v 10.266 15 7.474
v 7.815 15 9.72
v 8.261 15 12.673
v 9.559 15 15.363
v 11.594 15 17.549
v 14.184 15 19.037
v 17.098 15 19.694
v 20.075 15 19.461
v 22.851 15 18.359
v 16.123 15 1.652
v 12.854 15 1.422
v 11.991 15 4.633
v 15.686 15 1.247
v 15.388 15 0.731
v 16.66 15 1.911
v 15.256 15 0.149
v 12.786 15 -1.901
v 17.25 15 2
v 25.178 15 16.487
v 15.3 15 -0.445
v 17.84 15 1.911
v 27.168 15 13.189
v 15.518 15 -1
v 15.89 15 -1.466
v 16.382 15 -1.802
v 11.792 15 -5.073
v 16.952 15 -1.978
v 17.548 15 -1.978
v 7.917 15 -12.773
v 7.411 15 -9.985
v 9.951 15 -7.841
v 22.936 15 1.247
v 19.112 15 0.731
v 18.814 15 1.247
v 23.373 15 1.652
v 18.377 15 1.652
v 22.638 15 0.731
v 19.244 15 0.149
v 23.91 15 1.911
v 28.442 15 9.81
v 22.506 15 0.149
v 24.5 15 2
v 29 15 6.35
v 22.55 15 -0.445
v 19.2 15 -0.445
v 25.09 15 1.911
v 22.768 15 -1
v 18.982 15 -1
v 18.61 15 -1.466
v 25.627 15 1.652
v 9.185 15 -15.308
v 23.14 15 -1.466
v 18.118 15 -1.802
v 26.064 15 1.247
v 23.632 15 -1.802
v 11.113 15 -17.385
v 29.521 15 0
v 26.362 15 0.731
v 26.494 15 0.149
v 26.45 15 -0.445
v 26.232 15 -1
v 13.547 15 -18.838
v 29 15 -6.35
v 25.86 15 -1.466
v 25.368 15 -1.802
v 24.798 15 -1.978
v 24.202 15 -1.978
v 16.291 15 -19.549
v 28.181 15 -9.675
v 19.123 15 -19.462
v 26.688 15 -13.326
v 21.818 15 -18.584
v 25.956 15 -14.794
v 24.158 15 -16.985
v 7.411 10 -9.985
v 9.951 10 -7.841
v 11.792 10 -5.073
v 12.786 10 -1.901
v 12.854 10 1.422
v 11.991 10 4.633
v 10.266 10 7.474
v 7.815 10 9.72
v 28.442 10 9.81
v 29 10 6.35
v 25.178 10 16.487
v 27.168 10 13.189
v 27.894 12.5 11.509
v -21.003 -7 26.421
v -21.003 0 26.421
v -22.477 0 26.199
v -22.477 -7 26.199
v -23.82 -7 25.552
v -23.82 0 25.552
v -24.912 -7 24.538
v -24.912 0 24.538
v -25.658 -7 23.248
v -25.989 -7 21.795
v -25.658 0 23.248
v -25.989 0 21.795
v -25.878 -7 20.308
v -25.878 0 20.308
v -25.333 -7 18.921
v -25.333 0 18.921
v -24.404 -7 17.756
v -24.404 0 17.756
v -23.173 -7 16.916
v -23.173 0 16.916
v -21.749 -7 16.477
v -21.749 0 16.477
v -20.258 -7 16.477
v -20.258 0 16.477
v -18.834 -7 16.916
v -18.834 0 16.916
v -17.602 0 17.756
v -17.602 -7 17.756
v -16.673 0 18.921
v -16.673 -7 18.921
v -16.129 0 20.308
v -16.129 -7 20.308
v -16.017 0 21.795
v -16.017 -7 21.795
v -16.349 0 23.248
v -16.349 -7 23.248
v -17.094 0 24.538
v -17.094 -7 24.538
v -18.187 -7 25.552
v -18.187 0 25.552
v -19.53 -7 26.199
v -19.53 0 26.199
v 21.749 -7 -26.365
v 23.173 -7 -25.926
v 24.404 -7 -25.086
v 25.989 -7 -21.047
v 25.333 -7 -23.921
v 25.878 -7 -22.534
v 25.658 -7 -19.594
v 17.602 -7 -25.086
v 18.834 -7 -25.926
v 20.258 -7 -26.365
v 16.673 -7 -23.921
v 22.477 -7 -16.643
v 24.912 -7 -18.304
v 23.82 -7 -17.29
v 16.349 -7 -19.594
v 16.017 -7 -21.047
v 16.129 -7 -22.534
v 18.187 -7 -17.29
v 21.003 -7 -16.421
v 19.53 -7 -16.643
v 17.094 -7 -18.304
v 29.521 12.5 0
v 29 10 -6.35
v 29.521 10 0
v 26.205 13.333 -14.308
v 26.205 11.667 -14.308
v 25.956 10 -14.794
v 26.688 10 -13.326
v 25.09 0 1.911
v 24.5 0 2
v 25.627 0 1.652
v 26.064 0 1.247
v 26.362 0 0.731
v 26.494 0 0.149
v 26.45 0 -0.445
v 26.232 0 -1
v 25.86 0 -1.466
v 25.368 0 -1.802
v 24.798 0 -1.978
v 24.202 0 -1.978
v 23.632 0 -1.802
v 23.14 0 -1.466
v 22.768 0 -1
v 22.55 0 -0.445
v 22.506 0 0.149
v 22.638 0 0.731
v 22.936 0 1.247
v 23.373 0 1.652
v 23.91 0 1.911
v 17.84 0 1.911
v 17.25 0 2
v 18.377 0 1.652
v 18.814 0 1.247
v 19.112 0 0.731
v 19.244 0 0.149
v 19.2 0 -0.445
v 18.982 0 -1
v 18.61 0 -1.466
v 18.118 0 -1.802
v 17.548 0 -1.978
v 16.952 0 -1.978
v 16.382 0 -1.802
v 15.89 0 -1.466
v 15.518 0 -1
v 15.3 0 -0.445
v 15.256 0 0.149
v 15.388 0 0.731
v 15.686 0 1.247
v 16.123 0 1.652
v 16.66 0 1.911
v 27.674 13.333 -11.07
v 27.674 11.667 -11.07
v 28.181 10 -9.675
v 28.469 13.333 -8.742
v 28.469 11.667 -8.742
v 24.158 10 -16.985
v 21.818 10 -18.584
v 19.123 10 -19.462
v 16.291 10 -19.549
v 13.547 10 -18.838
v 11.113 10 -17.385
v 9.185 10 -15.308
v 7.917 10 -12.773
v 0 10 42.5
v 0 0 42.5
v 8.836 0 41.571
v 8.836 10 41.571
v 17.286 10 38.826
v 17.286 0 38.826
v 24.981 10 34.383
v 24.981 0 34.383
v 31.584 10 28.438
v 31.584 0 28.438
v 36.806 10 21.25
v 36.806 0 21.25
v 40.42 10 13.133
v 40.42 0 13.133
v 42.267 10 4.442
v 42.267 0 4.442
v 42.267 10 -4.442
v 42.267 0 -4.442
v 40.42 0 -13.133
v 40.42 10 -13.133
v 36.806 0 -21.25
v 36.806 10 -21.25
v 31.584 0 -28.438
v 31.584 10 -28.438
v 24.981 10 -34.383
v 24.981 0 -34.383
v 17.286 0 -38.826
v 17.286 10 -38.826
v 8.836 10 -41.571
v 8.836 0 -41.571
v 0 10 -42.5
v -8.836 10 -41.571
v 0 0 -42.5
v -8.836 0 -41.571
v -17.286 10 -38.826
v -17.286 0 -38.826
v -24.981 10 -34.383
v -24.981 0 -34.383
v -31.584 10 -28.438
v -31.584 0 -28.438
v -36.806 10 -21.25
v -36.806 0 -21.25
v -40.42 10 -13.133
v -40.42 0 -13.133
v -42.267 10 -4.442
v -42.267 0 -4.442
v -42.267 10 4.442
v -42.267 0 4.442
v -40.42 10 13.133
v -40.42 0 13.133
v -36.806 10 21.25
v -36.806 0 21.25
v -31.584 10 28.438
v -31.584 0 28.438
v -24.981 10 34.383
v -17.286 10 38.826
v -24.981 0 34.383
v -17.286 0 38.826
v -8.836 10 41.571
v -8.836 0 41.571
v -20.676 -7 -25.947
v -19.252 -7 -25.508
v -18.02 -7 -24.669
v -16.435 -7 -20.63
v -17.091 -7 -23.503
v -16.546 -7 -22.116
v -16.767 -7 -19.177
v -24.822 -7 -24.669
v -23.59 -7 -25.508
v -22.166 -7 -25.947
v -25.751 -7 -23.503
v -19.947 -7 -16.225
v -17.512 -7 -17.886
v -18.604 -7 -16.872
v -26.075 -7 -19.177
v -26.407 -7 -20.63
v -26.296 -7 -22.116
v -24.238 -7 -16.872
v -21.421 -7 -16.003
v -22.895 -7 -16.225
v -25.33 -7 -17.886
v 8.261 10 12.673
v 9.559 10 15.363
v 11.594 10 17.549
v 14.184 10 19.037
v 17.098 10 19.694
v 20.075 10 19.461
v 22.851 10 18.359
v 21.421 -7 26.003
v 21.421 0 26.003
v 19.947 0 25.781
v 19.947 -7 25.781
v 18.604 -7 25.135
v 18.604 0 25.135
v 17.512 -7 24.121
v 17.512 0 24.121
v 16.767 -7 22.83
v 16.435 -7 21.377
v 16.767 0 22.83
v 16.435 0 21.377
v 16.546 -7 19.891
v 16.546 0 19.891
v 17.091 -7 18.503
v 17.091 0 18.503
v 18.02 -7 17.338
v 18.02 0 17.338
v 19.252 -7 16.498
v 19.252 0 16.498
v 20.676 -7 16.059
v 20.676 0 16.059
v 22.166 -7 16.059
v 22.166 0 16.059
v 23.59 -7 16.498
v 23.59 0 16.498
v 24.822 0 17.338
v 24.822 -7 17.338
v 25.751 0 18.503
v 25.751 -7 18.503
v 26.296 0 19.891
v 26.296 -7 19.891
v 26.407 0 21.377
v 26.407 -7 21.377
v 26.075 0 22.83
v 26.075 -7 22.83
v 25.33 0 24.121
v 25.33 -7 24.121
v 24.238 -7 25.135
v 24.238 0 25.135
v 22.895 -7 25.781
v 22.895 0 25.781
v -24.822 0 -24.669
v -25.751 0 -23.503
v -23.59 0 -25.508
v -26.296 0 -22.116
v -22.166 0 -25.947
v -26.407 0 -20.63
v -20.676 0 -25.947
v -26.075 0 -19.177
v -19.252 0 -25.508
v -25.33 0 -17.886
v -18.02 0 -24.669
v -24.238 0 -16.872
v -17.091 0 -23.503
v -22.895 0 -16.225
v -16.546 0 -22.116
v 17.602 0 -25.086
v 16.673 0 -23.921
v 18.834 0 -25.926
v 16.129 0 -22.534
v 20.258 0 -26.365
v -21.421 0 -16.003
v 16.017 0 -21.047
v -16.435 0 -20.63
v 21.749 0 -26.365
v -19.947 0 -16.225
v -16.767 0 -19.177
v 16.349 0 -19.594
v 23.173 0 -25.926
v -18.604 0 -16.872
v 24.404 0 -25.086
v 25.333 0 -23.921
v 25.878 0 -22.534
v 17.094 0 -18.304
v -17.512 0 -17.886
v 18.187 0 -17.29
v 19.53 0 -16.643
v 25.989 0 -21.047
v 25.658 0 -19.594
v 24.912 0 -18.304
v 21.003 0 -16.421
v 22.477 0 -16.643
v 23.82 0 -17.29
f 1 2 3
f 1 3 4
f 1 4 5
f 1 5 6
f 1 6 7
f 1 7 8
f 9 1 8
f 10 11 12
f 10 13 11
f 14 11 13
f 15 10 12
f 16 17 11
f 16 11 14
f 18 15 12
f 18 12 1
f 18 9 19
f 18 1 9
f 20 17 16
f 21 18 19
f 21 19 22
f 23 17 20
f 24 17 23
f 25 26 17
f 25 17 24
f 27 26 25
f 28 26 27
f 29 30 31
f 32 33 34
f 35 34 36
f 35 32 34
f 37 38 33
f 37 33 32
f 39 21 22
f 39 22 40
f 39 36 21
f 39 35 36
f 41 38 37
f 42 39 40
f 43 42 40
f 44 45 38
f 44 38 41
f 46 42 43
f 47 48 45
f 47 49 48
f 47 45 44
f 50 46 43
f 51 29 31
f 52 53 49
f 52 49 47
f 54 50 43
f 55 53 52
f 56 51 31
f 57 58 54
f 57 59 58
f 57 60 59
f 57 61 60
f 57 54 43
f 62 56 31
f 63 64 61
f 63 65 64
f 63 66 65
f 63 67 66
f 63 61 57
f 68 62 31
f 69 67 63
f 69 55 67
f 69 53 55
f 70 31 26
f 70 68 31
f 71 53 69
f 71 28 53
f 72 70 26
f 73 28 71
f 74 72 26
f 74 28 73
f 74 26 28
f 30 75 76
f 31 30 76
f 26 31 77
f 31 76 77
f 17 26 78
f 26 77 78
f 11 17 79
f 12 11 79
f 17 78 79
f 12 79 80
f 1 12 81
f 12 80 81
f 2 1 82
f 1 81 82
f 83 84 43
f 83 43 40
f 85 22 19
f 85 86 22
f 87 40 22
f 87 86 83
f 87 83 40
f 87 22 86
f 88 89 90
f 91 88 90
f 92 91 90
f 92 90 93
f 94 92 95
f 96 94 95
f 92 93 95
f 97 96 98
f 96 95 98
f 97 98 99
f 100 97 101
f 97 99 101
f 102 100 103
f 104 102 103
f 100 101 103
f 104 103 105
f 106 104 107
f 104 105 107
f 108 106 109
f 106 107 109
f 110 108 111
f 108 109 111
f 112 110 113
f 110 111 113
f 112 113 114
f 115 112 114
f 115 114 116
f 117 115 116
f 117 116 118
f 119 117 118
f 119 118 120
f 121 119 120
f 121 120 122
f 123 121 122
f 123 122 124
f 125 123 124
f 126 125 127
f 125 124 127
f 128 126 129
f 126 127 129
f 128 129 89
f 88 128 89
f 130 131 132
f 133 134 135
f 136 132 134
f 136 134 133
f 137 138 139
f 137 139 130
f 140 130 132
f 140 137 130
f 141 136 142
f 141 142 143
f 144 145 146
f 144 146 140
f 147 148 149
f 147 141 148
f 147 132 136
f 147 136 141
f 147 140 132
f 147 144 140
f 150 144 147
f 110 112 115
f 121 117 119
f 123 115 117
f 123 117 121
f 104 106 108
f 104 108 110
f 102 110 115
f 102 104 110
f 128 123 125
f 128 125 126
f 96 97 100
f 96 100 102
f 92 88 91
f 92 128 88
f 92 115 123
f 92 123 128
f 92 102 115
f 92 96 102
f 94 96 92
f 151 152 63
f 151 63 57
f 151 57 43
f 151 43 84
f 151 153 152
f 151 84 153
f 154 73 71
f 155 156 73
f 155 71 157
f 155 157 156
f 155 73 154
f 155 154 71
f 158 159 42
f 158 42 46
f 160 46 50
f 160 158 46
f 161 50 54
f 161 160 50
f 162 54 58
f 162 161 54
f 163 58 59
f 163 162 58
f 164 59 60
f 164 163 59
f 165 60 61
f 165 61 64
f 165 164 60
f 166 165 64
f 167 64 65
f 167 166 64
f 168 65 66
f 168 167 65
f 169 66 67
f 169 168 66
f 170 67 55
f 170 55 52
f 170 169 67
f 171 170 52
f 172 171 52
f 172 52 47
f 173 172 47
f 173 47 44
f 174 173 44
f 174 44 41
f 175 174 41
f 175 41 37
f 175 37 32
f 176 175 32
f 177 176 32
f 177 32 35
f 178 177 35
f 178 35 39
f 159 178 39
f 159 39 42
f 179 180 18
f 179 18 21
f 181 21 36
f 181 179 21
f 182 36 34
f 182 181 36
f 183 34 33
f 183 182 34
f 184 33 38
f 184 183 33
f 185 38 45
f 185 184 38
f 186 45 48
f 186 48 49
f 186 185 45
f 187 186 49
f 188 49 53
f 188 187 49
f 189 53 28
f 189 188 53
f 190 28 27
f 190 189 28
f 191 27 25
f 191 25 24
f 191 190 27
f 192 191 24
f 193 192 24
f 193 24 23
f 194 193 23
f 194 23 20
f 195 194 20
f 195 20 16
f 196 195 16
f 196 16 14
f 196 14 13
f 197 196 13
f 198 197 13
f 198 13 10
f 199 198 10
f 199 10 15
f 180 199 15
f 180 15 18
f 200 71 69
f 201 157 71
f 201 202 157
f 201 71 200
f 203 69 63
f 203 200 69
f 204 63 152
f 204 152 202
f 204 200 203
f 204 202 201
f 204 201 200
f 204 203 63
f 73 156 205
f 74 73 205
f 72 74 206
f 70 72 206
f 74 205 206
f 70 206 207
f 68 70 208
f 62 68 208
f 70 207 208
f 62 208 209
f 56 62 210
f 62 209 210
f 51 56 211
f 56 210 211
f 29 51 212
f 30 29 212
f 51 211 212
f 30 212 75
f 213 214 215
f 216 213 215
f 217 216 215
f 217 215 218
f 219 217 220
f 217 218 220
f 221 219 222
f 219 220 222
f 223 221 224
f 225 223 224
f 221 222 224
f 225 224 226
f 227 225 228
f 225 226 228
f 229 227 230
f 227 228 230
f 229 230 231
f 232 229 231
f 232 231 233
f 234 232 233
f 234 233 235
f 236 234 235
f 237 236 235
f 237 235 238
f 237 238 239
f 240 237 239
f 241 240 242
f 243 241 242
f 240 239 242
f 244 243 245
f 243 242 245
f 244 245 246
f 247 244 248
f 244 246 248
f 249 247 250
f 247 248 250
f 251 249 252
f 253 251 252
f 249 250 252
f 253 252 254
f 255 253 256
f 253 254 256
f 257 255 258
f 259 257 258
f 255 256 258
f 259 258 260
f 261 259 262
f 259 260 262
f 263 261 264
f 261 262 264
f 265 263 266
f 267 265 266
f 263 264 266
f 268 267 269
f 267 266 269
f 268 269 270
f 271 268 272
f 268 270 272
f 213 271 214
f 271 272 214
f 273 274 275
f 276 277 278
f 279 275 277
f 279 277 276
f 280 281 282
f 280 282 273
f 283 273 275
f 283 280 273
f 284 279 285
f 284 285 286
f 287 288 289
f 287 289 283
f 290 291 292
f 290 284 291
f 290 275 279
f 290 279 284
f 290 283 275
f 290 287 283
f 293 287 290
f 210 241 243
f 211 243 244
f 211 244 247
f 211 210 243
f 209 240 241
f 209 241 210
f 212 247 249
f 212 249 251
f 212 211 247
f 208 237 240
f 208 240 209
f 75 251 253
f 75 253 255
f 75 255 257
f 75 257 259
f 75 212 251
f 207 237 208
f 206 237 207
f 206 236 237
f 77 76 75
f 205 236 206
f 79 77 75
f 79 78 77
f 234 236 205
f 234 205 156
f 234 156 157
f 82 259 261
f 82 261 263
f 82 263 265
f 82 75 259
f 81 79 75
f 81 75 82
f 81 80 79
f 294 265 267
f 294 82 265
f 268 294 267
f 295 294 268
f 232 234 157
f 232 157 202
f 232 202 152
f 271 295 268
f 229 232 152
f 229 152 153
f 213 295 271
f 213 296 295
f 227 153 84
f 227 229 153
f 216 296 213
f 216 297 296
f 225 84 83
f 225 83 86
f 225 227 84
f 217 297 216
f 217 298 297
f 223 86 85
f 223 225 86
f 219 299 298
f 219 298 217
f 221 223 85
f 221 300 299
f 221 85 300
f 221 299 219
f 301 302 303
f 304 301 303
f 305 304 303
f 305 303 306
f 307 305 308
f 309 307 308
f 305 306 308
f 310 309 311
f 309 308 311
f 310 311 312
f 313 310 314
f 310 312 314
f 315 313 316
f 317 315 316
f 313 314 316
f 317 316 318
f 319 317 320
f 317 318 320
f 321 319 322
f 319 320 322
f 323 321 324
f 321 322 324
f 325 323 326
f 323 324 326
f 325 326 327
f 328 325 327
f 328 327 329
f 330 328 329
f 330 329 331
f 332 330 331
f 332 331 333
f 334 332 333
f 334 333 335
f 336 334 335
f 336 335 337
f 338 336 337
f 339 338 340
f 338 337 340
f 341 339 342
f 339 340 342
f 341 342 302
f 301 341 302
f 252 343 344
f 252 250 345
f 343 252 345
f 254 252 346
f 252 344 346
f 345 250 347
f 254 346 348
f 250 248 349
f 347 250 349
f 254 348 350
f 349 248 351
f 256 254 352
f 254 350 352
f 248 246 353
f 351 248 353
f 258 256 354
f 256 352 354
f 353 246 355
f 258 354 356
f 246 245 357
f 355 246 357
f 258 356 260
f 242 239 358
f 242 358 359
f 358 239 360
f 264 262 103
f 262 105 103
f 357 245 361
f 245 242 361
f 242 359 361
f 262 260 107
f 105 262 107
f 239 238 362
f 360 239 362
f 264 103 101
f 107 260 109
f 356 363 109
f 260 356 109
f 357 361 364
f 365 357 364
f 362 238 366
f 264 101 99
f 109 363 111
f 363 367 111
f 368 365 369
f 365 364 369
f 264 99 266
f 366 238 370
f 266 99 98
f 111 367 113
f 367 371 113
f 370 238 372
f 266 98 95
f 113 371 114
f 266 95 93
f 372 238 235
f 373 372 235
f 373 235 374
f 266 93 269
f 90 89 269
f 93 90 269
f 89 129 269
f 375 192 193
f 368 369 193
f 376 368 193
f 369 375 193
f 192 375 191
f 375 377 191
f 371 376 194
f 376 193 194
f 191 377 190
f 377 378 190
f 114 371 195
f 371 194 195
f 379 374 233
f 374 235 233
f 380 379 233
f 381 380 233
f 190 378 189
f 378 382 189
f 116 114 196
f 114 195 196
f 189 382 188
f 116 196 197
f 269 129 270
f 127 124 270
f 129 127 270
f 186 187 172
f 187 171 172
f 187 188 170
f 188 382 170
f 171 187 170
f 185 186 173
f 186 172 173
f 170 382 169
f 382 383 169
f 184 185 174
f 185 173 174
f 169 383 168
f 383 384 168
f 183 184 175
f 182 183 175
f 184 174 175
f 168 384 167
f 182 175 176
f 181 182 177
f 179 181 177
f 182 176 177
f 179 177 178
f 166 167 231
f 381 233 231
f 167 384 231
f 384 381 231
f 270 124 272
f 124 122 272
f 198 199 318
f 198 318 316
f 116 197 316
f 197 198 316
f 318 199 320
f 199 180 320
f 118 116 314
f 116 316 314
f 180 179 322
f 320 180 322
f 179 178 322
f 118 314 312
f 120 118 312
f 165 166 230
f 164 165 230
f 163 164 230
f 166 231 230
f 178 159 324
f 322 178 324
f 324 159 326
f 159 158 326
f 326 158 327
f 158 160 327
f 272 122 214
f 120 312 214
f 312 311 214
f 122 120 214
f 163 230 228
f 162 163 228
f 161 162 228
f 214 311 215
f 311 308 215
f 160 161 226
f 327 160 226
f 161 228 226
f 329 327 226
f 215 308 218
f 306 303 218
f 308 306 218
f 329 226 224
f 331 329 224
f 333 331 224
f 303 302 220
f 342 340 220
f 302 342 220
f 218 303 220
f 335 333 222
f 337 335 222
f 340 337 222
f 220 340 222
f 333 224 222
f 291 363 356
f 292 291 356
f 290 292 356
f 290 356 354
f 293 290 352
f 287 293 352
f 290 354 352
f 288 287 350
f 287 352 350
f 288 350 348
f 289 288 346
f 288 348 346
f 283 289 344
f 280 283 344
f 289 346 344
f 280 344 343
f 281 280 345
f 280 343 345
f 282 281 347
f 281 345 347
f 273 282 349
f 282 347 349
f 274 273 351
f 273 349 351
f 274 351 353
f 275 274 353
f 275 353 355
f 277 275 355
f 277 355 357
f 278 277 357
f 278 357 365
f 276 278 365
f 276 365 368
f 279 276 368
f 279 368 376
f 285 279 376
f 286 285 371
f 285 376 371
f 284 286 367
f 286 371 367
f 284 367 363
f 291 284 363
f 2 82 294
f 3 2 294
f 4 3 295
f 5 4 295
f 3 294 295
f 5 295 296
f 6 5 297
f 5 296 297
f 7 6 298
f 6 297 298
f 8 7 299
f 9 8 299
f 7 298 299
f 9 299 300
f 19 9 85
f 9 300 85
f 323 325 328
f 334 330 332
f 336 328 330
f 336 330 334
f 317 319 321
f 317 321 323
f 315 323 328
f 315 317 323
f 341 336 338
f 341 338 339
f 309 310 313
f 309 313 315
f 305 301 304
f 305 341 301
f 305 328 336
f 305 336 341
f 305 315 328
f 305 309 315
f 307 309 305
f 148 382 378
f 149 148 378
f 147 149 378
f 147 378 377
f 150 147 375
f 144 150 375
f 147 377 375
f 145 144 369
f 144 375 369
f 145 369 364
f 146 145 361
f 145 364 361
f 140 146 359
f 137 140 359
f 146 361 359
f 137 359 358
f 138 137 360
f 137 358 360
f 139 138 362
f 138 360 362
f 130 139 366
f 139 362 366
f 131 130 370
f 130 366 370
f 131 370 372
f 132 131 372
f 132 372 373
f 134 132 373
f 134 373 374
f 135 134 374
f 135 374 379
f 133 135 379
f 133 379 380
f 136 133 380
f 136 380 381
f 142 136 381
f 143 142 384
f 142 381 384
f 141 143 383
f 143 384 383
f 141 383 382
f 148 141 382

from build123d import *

# Parameters (mm, degrees)
SKETCH1_R               = 42.5
BOSS_EXTRUDE1_DEPTH     = 10
SKETCH2_R               = 5
BOSS_EXTRUDE2_DEPTH     = 7
SKETCH3_R               = 2
BOSS_EXTRUDE3_DEPTH     = 5
CUT_EXTRUDE1_DEPTH      = 63.461988577
CUT_EXTRUDE1_DEPTH_BACK = 63.461988577
SKETCH3_4_R             = 2


with BuildPart() as part:
    # Sketch1 → Boss-Extrude1 (new body)
    with BuildSketch(Plane(origin=(0, 0, 0), x_dir=(1, 0, 0), z_dir=(0, 1, 0))):
        Circle(SKETCH1_R)
    extrude(amount=BOSS_EXTRUDE1_DEPTH)

    # Sketch2 → Boss-Extrude2 (add)
    with BuildSketch(Plane.XZ):
        with Locations((-21.003335433, 21.421015399)):
            Circle(SKETCH2_R)
        with Locations((21.421015399, 21.003335433)):
            Circle(SKETCH2_R)
        with Locations((21.003335433, -21.421015399)):
            Circle(SKETCH2_R)
        with Locations((-21.421015399, -21.003335433)):
            Circle(SKETCH2_R)
    extrude(amount=BOSS_EXTRUDE2_DEPTH)

    # Sketch3 → Boss-Extrude3 (add)
    with BuildSketch(Plane(origin=(0, 10, 0), x_dir=(1, 0, 0), z_dir=(0, 1, 0))):
        with BuildLine():
            ThreePointArc((7.410610084, 9.984822024), (12.938182194, 0.241771609), (7.815144583, -9.719933589))
            ThreePointArc((7.815144583, -9.719933589), (14.183962111, -19.037364236), (25.178047354, -16.486591759))
            add(Edge.make_bspline(
                [(29, -6.35), (28.699050384, -11.600454078), (25.178047354, -16.486591759)],
                knots=[0.67268265, 0.67268265, 0.67268265, 1, 1, 1], degree=2))
            add(Edge.make_bspline(
                [(29, 6.35), (30.042272144, 0), (29, -6.35)],
                knots=[0, 0, 0, 1, 1, 1], degree=2))
            add(Edge.make_bspline(
                [(26.688052402, 13.325870914), (27.746594537, 11.107404767), (28.624649084, 8.772780294), (29, 6.35)],
                knots=[0.050650552, 0.050650552, 0.050650552, 0.050650552, 0.277553495, 0.277553495, 0.277553495, 0.277553495], degree=3))
            add(Edge.make_bspline(
                [(25.95577439, 14.793850517), (26.206471304, 14.310519768), (26.451758672, 13.821089407), (26.688052402, 13.325870914)],
                knots=[0, 0, 0, 0, 0.050650552, 0.050650552, 0.050650552, 0.050650552], degree=3))
            ThreePointArc((25.95577439, 14.793850517), (14.893502945, 19.290955178), (7.410610084, 9.984822024))
        make_face()
        with Locations((24.5, 0)):
            Circle(SKETCH3_R, mode=Mode.SUBTRACT)
        with Locations((17.25, 0)):
            Circle(SKETCH3_R, mode=Mode.SUBTRACT)
    extrude(amount=BOSS_EXTRUDE3_DEPTH)

    # Sketch3<4> → Cut-Extrude1 (cut, two sides: drawn at the far end of the back side and taken through both)
    with BuildSketch(Plane(origin=(0, 10, 0), x_dir=(1, 0, 0), z_dir=(0, 1, 0)).offset(-CUT_EXTRUDE1_DEPTH_BACK)):
        with Locations((17.25, 0)):
            Circle(SKETCH3_4_R)
        with Locations((24.5, 0)):
            Circle(SKETCH3_4_R)
    extrude(amount=CUT_EXTRUDE1_DEPTH + CUT_EXTRUDE1_DEPTH_BACK, mode=Mode.SUBTRACT)


solid = part.part
